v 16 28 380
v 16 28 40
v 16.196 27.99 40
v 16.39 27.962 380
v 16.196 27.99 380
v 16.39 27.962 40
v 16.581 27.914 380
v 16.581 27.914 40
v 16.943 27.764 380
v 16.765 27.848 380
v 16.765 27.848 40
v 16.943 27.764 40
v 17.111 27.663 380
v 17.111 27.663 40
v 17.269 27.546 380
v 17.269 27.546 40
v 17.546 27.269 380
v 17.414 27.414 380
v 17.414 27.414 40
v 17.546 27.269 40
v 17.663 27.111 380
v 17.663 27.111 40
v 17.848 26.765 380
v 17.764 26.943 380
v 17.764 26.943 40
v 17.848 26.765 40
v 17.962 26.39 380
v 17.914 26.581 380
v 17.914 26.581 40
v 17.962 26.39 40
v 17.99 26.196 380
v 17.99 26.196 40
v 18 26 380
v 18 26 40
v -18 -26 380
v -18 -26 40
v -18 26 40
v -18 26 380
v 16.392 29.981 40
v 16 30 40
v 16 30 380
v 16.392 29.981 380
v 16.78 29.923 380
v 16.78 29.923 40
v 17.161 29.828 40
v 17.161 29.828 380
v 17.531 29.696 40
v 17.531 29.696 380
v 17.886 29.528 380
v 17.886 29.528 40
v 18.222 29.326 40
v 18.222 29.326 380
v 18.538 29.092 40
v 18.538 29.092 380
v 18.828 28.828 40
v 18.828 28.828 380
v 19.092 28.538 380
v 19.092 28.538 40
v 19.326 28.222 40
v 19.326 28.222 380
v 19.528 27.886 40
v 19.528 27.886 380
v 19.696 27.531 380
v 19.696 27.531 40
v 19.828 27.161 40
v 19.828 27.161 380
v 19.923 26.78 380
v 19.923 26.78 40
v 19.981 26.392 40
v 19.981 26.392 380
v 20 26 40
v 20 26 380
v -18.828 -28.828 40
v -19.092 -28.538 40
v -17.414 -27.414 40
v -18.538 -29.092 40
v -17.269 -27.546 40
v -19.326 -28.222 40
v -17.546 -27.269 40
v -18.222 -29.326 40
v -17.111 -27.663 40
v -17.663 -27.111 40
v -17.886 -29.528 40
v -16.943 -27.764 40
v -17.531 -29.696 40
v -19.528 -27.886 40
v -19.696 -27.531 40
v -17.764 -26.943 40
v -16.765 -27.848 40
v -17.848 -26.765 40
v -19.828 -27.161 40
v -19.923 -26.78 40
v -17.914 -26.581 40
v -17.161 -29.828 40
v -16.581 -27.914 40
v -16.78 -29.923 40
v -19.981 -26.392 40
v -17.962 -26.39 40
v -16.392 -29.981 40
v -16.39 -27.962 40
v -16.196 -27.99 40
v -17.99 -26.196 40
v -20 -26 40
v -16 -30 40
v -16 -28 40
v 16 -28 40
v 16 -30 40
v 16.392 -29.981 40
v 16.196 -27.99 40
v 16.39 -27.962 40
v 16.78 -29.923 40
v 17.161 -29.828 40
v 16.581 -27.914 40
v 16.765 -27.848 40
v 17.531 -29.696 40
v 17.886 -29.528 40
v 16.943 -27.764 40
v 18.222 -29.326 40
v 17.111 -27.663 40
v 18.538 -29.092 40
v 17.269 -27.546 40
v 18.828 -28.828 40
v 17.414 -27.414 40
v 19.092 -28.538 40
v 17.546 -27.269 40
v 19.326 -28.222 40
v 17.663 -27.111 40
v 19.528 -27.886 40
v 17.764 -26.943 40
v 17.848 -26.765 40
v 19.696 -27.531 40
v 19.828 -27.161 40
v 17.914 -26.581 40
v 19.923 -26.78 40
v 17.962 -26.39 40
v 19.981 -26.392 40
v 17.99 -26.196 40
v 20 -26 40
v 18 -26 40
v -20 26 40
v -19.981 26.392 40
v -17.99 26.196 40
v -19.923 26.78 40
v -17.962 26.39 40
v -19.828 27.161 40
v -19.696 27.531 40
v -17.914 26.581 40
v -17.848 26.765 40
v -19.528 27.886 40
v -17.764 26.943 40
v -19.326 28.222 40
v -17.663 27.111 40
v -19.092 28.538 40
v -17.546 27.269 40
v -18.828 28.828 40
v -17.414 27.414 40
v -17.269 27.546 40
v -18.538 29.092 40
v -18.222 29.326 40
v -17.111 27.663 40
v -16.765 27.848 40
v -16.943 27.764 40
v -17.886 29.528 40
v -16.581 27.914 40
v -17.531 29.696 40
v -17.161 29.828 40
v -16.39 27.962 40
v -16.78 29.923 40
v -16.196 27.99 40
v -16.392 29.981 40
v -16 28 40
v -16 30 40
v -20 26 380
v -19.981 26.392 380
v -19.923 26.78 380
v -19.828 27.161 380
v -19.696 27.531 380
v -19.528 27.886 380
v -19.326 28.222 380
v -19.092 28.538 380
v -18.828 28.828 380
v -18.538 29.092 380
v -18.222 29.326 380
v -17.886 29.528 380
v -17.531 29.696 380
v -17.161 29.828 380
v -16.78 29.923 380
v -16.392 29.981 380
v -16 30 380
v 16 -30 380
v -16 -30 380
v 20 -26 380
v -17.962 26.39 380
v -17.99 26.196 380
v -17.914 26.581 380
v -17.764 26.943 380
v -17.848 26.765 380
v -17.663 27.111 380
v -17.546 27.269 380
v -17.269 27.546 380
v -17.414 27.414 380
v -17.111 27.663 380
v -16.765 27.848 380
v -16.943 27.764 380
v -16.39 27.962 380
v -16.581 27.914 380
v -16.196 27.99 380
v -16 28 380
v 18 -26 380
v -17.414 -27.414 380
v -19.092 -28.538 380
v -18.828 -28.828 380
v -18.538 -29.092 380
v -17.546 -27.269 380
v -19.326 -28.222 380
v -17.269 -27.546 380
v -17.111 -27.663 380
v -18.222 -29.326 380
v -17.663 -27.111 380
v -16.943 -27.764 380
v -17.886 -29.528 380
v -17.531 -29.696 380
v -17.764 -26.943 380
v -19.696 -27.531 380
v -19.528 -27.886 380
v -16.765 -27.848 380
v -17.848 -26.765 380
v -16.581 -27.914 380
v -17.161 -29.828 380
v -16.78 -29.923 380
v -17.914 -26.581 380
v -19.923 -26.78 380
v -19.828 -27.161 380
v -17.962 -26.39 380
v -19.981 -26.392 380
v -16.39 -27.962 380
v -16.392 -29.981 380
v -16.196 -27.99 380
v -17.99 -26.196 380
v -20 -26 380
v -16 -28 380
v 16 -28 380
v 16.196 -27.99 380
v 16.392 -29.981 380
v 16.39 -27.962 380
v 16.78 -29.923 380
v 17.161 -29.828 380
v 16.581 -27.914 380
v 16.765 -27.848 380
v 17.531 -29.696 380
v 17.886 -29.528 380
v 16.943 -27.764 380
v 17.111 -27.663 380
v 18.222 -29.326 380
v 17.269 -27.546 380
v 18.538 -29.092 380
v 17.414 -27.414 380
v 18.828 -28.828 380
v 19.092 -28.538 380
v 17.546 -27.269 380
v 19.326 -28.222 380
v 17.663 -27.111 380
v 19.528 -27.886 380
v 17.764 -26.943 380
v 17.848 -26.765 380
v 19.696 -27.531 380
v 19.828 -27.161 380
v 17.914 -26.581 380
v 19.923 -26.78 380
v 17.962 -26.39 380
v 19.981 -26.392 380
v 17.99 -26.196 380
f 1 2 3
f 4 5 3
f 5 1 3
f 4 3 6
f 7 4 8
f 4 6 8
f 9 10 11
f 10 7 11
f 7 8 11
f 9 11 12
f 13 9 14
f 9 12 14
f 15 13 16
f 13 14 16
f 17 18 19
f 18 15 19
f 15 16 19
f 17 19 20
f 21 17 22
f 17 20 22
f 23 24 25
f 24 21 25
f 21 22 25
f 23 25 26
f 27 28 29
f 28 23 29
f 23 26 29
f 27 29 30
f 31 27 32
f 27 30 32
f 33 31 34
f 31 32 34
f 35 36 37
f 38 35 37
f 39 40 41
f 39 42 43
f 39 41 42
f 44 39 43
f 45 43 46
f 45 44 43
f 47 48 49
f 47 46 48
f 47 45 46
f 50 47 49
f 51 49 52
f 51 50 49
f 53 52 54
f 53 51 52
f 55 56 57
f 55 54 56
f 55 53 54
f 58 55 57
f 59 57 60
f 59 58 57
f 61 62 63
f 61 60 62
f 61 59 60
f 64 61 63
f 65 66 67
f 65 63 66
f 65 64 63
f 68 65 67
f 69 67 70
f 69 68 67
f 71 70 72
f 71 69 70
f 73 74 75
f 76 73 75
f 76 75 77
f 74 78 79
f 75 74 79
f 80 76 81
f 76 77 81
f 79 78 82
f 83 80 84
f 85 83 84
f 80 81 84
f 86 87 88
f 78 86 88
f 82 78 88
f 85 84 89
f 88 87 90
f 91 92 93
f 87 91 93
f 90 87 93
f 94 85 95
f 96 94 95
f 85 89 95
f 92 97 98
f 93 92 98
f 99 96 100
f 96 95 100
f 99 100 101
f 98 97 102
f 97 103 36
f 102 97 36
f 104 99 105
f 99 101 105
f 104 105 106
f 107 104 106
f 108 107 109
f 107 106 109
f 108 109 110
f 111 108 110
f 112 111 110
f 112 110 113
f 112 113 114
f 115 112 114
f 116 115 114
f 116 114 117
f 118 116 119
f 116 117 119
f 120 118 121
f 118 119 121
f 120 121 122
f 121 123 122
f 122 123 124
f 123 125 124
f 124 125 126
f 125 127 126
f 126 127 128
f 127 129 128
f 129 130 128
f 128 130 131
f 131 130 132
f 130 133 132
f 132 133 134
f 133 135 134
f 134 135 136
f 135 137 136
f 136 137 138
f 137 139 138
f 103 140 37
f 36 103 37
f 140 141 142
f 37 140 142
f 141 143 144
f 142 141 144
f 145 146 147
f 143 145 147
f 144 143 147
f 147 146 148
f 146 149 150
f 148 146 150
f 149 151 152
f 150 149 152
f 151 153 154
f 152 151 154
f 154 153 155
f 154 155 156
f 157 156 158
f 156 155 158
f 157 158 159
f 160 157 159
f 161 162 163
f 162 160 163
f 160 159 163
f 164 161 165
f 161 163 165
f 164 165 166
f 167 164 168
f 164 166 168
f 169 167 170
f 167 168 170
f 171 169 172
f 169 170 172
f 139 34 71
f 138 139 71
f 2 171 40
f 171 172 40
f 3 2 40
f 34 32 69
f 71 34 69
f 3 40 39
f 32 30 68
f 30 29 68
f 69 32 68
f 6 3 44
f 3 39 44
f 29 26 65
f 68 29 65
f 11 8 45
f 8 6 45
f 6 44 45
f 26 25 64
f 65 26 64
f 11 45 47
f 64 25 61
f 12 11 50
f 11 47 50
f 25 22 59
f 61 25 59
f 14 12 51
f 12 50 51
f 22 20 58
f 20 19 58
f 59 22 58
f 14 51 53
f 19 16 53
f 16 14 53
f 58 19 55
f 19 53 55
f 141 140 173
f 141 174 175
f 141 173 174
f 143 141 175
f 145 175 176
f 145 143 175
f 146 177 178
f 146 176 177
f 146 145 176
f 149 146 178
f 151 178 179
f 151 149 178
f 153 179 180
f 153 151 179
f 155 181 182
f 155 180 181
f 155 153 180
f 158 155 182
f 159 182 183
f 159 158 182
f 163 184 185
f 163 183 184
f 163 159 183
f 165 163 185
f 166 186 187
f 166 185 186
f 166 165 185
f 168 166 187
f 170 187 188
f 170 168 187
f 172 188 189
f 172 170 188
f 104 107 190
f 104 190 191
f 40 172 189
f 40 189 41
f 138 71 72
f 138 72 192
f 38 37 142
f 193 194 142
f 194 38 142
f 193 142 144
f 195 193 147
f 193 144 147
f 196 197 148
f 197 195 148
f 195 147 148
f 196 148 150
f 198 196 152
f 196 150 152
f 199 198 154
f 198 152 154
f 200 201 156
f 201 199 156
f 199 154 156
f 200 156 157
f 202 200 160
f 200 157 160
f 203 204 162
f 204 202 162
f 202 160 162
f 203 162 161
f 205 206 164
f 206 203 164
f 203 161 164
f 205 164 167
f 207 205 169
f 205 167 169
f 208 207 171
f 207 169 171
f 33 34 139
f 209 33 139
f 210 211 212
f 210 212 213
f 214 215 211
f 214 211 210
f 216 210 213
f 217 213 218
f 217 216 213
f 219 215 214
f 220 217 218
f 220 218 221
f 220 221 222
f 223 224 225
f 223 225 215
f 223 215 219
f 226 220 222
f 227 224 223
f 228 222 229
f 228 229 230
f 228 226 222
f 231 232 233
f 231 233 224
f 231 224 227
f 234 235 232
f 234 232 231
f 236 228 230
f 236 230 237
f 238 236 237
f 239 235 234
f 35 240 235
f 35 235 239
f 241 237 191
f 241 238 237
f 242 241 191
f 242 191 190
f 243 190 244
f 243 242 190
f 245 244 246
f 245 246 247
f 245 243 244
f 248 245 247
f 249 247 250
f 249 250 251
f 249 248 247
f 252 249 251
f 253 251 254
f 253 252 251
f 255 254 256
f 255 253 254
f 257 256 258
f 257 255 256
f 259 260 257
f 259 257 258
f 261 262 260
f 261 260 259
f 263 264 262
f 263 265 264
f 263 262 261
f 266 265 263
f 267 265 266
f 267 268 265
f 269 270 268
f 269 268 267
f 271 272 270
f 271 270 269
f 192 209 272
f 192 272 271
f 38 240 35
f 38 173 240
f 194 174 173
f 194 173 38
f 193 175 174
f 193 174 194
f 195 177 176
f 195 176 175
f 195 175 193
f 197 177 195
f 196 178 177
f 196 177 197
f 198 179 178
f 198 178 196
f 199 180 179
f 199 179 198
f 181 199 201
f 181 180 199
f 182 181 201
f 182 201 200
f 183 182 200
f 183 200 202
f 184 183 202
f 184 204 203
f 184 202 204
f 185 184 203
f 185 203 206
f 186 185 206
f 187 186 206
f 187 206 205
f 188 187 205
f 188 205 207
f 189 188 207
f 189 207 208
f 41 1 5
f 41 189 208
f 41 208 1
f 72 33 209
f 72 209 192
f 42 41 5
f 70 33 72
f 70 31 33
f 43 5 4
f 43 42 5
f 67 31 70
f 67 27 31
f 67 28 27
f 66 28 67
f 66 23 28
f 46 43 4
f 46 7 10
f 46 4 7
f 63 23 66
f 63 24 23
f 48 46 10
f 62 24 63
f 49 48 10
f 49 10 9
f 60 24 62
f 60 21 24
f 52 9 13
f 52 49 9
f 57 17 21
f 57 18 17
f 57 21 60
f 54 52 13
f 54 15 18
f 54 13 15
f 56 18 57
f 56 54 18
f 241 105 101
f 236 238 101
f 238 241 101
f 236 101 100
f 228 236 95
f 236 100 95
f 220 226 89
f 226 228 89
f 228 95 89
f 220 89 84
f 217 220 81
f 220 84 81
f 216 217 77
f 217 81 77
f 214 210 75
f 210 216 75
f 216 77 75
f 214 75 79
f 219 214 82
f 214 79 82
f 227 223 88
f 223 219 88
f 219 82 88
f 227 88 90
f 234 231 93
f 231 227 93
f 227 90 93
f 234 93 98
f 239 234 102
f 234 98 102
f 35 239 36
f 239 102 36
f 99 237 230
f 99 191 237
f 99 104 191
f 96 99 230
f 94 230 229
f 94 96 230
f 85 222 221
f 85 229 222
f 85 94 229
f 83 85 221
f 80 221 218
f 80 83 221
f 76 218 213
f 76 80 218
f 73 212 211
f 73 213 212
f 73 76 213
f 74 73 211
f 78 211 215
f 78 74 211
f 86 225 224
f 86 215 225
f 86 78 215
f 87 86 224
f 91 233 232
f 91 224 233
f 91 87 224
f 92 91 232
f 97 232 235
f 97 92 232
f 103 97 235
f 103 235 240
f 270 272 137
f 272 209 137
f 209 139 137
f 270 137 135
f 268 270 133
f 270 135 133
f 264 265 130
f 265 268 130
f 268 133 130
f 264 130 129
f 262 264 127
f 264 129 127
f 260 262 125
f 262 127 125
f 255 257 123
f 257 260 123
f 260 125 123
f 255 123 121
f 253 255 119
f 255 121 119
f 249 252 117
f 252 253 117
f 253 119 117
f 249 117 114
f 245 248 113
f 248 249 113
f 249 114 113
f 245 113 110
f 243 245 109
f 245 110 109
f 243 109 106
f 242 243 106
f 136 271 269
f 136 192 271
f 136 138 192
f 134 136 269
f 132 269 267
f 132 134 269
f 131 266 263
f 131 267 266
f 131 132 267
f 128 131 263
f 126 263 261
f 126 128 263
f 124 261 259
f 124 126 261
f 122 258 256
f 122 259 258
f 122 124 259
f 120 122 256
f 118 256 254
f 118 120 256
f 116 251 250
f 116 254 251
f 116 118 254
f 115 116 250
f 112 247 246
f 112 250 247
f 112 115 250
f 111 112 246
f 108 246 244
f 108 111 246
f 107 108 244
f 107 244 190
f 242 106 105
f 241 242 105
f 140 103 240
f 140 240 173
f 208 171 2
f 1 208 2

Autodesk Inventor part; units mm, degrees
ref_plane "YZ Plane" through (0, 0, 0) normal (1, 0, 0) x (0, 1, 0)
ref_plane "Start Plane" through (0, 0, 40) normal (0, 0, 1) x (1, 0, 0)
ref_plane "End Plane" through (0, 0, 380) normal (0, 0, 1) x (1, 0, 0)
sketch "Sketch" plane through (0, 0, 0) normal (0, 0, 1) x (1, 0, 0)
  line L0 (-20, -26) -> (-20, 26)
  line L1 (-16, 30) -> (16, 30)
  line L2 (20, 26) -> (20, -26)
  line L3 (16, -30) -> (-16, -30)
  arc A0 (-20, -26) -> (-16, -30) centre (-16, -26) ccw
  arc A1 (20, 26) -> (16, 30) centre (16, 26) ccw
  arc A2 (-16, 30) -> (-20, 26) centre (-16, 26) ccw
  arc A3 (16, -30) -> (20, -26) centre (16, -26) ccw
  arc A4 (-16, 28) -> (-18, 26) centre (-16, 26) ccw
  line L4 (-16, 28) -> (16, 28)
  arc A5 (18, 26) -> (16, 28) centre (16, 26) ccw
  line L5 (18, 26) -> (18, -26)
  arc A6 (16, -28) -> (18, -26) centre (16, -26) ccw
  line L6 (16, -28) -> (-16, -28)
  arc A7 (-18, -26) -> (-16, -28) centre (-16, -26) ccw
  line L7 (-18, -26) -> (-18, 26)
  line L8 (0, 43.1598) -> (0, -43.1598) construction
  line L9 (-29.1598, 0) -> (29.1598, 0) construction
  dimension "d7" = 4
  dimension "d9" = 40
  dimension "d11" = 60
  dimension "d12" = 2
  dimension "d15" = 20
  dimension "d16" = 30
extrude "Body" add sketch "Sketch" along normal up to surface (340 mm away) from surface at 40
sketch "Sketch3" plane through (0, 0, 0) normal (0, 0, 1) x (1, 0, 0)
  line L0 (0, 0) -> (10, 0)
ref_plane "Work Plane3" through (0, 0, 0) normal (0, -1, 0) x (1, 0, 0)
sketch "Sketch4" plane through (0, 0, 0) normal (0, -1, 0) x (1, 0, 0)
  line L0 (-2, 40) -> (12, 40) projected
  line L1 (-2, 380) -> (12, 380) projected
  dimension "d18" = 340
equation "\"d7\" = G_IR"
equation "\"d9\" = G_W"
equation "\"d11\" = G_H"
equation "\"d12\" = G_T"
equation "\"d15\" = 0.5 * d9"
equation "\"d16\" = 0.5 * d11"
equation "\"d3\" = G_L"
equation "\"G_W\" = 40"
equation "\"G_H\" = 60"
equation "\"G_T\" = 2"
equation "\"G_IR\" = 4"
equation "\"G_L\" = d18"
equation "\"G_OFFSET_END\" = 0"
properties part number "ISO 10799-2 - 60x40x2 - 340" material "Steel, Mild"
